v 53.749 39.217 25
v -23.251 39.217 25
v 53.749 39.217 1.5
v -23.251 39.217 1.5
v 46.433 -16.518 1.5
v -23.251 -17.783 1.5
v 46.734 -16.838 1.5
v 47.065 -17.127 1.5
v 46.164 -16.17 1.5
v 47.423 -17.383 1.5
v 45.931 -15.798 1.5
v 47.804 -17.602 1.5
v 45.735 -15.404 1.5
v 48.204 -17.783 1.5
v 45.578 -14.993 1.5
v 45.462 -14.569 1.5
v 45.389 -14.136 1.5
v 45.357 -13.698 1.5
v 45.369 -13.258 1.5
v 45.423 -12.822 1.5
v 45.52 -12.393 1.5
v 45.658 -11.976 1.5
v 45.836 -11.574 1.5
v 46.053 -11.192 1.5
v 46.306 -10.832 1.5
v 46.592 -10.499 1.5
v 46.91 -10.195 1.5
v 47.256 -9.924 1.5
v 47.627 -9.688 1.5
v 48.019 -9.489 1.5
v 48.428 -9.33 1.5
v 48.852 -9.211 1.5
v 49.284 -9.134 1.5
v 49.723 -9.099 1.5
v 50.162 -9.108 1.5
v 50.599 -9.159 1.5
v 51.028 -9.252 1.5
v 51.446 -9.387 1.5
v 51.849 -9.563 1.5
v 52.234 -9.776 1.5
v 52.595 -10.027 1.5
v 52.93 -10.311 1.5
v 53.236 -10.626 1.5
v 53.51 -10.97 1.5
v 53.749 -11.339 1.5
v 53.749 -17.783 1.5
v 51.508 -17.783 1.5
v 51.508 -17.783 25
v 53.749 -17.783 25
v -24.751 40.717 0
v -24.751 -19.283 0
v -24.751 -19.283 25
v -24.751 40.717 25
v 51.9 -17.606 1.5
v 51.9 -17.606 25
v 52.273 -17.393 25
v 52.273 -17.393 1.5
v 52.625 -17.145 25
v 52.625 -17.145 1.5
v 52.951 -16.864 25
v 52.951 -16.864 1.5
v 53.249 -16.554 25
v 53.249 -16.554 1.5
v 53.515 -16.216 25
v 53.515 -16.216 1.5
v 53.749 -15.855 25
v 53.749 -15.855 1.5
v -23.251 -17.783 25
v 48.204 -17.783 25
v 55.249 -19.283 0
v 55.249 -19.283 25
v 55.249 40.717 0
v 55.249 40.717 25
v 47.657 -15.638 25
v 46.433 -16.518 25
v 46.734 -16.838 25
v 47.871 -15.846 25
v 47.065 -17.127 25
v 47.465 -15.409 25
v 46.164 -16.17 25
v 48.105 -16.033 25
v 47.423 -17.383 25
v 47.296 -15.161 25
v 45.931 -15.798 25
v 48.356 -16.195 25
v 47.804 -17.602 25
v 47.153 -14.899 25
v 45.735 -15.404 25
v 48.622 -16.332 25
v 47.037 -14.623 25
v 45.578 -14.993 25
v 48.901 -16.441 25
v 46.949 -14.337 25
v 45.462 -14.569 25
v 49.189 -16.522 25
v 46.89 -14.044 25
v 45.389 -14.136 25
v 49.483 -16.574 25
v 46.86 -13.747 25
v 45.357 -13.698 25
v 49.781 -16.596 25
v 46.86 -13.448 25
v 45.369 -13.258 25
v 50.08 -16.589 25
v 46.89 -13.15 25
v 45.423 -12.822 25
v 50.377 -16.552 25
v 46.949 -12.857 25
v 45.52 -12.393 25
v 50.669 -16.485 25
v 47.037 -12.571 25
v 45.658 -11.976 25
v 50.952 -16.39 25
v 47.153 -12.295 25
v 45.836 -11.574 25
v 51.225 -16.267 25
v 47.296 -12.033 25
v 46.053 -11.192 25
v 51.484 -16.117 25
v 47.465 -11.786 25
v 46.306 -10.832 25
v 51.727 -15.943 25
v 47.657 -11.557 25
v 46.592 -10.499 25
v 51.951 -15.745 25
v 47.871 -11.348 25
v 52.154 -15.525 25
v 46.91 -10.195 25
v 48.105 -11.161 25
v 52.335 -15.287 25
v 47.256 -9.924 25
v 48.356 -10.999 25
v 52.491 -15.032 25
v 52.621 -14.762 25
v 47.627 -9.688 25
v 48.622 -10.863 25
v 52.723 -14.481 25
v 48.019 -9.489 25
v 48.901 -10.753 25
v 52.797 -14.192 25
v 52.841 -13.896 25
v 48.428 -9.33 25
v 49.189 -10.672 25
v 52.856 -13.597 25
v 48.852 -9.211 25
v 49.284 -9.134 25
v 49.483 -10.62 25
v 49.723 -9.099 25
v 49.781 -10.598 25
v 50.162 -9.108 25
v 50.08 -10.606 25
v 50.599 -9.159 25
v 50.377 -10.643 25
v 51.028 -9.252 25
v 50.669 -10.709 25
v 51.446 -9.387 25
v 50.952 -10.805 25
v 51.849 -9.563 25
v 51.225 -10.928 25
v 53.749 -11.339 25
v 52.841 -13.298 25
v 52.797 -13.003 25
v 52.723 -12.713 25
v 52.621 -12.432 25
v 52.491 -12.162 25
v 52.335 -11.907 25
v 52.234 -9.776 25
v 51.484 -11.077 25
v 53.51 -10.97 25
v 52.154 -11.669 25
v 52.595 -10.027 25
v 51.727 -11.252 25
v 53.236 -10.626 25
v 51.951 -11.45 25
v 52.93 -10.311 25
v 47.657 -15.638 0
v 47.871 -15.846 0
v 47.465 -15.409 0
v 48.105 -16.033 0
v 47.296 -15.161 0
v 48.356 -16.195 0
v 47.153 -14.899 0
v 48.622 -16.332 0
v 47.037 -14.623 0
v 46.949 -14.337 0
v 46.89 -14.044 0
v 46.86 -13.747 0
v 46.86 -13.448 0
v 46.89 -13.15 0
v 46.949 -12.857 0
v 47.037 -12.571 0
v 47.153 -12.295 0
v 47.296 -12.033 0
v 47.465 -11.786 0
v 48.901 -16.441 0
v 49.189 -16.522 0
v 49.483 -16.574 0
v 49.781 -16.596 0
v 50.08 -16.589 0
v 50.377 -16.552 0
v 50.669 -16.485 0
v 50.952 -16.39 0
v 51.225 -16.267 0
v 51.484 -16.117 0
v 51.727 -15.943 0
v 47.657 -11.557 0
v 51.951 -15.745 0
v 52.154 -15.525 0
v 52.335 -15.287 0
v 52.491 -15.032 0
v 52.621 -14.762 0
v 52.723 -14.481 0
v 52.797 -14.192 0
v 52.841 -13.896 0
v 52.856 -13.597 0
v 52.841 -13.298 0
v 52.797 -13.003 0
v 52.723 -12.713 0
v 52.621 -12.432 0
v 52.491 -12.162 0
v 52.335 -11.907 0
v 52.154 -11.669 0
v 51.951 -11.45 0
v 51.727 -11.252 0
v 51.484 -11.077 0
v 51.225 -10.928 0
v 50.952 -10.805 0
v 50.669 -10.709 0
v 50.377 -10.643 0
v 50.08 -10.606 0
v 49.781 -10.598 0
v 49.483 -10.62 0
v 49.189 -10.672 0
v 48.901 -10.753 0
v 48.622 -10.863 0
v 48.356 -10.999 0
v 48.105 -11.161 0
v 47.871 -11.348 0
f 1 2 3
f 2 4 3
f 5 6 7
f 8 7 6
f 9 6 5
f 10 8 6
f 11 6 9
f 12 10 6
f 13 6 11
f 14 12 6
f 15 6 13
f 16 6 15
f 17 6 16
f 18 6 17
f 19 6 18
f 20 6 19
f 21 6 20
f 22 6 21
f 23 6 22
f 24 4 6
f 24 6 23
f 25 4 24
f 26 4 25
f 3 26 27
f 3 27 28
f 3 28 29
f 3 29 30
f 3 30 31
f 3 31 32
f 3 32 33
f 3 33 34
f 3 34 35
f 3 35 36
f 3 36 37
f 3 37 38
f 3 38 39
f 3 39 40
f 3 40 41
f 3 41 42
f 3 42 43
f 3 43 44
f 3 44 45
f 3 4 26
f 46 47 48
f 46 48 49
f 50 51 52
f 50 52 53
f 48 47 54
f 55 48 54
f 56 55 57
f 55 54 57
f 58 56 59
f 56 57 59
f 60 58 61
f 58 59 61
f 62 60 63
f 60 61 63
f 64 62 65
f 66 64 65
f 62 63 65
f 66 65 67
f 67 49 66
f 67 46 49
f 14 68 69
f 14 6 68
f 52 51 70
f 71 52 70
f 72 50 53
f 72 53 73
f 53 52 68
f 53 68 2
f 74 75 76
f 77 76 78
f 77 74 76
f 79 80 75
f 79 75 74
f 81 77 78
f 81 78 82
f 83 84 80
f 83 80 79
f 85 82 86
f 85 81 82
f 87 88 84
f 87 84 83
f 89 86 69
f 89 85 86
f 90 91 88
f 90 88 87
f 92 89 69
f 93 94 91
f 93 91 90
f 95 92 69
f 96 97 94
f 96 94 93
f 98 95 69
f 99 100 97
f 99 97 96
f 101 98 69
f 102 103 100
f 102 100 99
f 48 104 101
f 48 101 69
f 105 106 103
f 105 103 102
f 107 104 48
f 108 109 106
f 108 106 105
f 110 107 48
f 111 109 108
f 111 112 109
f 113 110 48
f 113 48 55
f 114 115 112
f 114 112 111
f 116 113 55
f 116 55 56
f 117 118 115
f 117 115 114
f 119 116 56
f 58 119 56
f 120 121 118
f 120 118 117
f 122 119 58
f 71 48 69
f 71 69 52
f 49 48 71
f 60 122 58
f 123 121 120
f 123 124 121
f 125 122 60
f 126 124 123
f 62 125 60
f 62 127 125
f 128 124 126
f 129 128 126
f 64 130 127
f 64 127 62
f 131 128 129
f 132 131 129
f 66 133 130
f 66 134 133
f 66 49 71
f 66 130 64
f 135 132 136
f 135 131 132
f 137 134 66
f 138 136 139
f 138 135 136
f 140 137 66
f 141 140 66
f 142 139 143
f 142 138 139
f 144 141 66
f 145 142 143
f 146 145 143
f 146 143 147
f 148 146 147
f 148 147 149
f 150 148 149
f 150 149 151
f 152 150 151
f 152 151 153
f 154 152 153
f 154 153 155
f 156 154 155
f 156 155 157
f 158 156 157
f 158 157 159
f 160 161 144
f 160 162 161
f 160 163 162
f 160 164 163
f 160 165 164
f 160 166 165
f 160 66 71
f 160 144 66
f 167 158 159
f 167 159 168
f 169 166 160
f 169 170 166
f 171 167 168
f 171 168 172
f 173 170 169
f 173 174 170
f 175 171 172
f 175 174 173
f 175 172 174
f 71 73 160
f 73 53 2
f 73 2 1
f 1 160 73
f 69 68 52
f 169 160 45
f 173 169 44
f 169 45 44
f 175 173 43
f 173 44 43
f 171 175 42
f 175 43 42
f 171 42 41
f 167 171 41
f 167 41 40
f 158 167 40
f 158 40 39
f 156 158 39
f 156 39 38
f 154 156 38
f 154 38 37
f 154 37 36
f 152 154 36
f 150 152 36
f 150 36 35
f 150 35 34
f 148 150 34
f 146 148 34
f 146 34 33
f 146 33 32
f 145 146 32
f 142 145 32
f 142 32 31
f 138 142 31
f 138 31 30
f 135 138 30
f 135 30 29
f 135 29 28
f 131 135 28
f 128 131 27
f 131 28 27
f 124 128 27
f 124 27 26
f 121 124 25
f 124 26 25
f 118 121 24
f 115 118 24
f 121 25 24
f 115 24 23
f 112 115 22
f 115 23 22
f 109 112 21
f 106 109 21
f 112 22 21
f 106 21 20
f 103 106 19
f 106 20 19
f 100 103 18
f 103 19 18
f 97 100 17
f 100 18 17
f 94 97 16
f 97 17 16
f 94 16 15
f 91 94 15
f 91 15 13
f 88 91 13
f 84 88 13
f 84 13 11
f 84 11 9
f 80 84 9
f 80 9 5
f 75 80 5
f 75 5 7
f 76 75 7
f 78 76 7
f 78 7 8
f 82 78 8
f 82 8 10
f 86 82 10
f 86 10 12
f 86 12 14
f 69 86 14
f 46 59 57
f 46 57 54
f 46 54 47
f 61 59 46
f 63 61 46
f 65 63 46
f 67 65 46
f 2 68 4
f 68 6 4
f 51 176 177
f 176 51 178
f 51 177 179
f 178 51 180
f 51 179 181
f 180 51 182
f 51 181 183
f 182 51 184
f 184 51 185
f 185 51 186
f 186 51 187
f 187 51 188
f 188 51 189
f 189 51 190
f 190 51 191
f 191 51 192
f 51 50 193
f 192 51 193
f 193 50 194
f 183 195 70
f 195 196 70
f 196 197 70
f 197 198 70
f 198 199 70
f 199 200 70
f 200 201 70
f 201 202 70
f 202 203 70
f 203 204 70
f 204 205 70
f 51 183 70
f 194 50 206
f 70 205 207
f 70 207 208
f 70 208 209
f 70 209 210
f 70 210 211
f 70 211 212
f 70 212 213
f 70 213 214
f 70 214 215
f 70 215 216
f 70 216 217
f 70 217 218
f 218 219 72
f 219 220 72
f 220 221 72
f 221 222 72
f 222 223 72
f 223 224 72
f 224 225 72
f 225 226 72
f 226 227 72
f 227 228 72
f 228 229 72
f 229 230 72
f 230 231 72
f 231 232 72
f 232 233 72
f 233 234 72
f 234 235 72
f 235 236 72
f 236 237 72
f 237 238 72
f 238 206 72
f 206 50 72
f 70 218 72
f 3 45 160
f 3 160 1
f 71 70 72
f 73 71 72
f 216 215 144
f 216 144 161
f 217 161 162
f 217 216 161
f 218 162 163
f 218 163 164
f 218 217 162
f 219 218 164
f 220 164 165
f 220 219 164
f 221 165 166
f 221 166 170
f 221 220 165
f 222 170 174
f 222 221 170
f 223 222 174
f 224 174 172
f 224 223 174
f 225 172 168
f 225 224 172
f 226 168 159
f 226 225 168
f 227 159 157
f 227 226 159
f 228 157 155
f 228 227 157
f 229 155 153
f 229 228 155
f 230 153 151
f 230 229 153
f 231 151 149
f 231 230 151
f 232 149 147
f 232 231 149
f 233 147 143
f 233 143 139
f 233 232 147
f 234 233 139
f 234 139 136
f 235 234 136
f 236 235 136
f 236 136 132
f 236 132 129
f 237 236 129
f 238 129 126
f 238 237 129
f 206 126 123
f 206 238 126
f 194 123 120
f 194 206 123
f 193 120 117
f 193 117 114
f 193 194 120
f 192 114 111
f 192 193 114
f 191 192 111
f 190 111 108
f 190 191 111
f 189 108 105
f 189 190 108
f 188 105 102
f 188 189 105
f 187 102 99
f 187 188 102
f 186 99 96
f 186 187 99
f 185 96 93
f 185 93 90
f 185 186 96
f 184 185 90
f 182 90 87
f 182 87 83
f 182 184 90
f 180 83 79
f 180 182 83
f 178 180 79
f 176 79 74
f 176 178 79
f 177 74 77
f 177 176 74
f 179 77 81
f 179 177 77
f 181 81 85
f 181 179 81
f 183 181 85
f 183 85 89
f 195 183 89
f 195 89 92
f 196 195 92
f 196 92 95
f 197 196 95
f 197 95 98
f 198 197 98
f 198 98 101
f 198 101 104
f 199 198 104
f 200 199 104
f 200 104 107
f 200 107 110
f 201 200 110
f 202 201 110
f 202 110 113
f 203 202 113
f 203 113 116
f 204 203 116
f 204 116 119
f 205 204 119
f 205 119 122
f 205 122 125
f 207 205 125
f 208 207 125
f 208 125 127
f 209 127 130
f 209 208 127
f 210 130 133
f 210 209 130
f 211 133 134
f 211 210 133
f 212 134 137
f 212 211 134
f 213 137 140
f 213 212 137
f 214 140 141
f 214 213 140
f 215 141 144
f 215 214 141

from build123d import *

# Parameters (mm, degrees)
F0_W     = 80
F0_H     = 60
F0_R     = 3
F1_DEPTH = 25
F2_T     = -1.5


with BuildPart() as f1:
    # F0 (on Top) → F1 (new body)
    with BuildSketch(Plane.XY):
        with Locations((15.248706, 10.717015)):
            Rectangle(F0_W, F0_H)
        with Locations((49.856115, -13.597123)):
            Circle(F0_R, mode=Mode.SUBTRACT)
    extrude(amount=F1_DEPTH)

    # F2
    f2_openings = [f1.faces().sort_by_distance(p)[0] for p in [
        (15.043643, 10.861085, 25),
    ]]
    offset(amount=F2_T, openings=f2_openings)


solid = f1.part
